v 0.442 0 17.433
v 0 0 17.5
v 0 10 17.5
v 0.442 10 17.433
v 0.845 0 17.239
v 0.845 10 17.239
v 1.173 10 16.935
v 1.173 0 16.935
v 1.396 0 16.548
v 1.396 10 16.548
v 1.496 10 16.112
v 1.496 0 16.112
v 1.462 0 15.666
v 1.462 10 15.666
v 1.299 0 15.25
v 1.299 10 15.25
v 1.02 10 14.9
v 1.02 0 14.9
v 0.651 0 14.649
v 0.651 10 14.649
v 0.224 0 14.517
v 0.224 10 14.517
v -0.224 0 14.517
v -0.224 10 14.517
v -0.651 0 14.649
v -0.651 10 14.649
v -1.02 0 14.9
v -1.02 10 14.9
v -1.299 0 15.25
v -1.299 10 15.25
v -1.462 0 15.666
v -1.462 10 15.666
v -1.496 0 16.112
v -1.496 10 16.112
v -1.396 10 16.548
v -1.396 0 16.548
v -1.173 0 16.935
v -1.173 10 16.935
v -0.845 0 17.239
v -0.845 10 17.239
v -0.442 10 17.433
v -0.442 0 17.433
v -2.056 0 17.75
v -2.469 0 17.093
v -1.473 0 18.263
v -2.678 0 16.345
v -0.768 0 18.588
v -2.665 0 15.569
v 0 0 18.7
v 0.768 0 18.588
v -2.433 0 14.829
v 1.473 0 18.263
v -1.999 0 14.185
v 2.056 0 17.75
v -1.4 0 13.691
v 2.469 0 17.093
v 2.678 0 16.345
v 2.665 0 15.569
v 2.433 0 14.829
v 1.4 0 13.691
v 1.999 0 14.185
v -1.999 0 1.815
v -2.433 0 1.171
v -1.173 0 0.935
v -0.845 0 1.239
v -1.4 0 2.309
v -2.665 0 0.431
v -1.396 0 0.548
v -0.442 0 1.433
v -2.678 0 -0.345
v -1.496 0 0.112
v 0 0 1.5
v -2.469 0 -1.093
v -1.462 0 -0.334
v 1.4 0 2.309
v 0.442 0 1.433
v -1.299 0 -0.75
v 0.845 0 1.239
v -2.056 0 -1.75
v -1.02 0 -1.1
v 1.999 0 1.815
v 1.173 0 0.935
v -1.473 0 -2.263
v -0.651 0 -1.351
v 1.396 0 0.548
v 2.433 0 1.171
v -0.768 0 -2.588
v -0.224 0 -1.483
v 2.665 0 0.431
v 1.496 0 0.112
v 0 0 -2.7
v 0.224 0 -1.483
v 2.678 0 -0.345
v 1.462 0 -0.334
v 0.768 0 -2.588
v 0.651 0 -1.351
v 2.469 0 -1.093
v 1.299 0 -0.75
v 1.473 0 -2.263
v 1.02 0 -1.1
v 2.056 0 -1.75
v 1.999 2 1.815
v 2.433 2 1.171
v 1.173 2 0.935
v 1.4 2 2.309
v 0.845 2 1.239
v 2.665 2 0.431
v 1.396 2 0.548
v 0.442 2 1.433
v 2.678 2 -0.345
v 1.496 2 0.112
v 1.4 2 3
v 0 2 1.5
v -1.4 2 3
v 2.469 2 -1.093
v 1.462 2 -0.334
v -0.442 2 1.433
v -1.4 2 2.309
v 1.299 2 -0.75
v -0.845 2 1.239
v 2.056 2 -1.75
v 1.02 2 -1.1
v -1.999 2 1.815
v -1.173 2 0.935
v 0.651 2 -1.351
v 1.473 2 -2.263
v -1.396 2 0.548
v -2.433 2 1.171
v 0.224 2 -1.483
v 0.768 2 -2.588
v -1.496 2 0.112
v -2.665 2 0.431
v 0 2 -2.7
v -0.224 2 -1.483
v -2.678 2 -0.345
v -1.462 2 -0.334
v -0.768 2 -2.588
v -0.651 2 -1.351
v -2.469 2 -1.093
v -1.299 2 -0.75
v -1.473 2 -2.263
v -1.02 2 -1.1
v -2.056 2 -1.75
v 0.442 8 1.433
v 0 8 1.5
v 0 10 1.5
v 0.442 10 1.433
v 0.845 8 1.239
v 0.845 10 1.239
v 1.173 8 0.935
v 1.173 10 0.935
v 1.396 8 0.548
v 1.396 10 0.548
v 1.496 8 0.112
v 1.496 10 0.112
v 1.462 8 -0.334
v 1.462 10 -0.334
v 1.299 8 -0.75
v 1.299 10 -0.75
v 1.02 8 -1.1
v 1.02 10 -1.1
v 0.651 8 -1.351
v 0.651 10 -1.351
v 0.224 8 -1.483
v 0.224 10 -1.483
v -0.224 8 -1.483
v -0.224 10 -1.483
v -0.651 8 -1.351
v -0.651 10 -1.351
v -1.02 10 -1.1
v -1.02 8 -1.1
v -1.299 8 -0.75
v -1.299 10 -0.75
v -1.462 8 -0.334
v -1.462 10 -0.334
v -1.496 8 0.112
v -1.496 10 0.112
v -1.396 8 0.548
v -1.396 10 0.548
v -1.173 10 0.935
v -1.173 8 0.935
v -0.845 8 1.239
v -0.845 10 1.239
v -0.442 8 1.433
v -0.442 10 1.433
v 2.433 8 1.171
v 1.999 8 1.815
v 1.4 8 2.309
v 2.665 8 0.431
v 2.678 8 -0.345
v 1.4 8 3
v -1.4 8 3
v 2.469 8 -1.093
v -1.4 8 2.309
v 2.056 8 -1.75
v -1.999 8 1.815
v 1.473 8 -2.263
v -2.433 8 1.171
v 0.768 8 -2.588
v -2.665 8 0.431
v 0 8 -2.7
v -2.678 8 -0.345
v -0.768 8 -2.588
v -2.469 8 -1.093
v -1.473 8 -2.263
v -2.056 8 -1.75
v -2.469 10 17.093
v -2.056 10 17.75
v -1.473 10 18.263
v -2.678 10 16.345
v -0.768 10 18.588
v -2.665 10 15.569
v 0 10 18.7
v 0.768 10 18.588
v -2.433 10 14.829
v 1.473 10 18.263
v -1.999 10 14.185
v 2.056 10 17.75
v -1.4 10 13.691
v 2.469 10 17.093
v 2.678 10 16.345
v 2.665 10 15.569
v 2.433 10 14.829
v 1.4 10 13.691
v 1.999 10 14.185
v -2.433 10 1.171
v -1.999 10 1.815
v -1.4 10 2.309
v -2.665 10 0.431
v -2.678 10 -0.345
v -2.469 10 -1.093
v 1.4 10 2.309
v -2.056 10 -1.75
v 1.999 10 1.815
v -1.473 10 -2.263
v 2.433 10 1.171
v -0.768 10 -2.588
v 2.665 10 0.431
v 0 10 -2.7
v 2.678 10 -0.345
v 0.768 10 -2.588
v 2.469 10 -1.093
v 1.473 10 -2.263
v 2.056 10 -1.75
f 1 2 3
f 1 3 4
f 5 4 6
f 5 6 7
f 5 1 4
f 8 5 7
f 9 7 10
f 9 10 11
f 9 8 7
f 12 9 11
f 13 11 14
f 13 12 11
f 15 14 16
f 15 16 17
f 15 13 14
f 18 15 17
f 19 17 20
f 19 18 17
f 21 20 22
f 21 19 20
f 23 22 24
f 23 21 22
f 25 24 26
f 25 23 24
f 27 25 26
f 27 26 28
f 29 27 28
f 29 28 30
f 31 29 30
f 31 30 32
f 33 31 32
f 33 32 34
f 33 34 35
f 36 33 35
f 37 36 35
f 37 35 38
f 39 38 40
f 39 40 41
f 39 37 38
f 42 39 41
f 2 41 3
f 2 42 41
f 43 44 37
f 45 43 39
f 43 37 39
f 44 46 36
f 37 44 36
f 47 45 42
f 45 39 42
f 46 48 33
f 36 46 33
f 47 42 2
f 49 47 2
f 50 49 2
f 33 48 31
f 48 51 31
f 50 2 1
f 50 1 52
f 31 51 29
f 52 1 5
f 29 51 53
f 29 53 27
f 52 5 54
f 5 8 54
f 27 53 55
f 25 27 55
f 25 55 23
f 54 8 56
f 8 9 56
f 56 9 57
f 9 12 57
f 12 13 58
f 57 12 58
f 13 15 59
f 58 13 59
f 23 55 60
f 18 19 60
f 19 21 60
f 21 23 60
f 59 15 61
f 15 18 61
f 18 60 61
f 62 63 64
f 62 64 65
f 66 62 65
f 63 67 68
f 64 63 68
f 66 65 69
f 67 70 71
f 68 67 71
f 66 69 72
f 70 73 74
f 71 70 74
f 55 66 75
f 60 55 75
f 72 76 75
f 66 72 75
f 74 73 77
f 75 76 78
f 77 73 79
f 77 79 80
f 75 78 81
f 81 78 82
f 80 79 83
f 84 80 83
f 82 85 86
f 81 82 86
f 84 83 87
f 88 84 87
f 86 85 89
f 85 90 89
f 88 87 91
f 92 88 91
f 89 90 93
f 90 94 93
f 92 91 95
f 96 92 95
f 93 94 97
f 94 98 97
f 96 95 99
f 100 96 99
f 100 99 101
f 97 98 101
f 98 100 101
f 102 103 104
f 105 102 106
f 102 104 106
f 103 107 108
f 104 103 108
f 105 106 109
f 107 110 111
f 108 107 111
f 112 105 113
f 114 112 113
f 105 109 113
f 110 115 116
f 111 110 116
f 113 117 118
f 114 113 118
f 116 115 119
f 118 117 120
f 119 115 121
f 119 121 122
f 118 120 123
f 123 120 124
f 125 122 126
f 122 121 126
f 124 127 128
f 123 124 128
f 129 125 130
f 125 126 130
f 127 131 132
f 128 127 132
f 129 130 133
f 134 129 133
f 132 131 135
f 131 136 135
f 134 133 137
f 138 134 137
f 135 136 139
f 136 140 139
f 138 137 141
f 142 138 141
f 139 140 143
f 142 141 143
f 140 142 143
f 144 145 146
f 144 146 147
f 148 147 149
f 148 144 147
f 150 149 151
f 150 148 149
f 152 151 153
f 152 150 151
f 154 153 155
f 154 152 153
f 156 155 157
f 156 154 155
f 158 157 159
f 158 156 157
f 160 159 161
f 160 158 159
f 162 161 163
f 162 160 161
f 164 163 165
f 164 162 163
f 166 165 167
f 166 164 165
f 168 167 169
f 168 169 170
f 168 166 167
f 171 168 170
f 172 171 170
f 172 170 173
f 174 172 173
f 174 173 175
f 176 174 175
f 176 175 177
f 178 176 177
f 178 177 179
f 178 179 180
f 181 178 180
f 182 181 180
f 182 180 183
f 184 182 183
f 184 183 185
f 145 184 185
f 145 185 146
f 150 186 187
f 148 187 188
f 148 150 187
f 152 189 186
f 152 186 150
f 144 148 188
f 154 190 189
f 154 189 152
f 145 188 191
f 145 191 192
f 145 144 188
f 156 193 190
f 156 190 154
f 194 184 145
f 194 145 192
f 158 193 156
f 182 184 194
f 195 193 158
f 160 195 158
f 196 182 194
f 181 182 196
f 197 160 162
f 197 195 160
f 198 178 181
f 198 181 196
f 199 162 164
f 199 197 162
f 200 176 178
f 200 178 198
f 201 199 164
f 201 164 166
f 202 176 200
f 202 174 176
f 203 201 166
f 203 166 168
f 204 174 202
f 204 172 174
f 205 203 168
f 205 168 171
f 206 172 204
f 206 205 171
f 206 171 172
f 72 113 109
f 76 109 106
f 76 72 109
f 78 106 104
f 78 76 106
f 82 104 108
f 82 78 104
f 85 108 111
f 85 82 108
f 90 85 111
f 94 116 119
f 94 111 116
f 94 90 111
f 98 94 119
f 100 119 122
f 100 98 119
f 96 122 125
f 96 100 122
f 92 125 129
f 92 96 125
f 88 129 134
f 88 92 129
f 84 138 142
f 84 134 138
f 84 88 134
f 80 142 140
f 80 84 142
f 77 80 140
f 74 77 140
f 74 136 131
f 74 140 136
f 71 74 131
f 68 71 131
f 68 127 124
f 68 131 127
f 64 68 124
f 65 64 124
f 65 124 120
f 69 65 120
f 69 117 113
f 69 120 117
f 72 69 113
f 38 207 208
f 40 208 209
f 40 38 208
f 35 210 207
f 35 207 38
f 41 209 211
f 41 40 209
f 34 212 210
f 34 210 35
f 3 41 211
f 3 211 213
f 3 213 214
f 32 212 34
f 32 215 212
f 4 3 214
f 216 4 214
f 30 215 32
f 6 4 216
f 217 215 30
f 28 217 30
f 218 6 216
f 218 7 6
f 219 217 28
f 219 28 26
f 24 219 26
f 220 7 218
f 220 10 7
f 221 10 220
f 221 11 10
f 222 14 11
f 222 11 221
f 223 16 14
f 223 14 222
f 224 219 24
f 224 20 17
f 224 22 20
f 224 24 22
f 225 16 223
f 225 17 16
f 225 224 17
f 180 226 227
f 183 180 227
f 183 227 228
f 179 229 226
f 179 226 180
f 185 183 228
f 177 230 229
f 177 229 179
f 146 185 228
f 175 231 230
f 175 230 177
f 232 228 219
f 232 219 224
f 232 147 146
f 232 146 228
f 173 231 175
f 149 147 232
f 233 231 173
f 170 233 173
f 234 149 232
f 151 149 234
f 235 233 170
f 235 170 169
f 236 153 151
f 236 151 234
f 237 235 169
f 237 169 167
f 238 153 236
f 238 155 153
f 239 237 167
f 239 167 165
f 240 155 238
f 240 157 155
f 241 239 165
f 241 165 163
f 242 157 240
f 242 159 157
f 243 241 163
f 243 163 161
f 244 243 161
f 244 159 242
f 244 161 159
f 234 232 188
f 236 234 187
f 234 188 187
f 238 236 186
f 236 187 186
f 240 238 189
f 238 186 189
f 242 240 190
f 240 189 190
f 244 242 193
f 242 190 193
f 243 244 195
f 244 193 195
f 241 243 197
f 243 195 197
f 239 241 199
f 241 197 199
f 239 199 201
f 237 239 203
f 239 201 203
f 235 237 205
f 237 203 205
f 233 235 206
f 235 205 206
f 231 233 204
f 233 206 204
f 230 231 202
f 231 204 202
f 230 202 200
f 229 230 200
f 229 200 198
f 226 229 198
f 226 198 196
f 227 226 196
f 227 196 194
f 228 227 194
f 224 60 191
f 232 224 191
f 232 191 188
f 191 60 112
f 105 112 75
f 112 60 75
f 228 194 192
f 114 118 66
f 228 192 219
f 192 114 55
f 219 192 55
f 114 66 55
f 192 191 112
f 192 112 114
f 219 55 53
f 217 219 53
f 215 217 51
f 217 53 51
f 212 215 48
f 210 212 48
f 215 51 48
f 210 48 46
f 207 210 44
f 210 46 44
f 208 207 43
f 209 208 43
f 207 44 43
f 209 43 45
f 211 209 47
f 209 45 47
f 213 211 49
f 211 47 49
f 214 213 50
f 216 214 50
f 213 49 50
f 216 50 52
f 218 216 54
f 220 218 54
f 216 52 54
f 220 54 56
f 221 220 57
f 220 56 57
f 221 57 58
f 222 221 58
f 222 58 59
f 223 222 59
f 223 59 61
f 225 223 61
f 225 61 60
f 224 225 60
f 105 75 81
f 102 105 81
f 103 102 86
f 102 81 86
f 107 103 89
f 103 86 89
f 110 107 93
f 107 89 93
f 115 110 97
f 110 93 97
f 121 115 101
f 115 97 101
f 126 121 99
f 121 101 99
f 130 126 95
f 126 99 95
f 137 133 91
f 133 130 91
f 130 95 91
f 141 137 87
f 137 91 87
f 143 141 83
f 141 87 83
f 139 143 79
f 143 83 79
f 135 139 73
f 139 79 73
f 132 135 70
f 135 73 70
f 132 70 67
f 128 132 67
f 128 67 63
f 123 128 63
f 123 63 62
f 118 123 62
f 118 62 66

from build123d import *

# Parameters (mm, degrees)
SKETCH_1_R               = 1.5
EXTRUDE_1_DEPTH          = 10
CUT_EXTRUDE_1_DEPTH      = 3
CUT_EXTRUDE_1_DEPTH_BACK = 3
SKETCH_2_R               = 2.7


with BuildPart() as part:
    # 草图1 → 凸台-拉伸1 (new body)
    with BuildSketch(Plane(origin=(0, 0, 0), x_dir=(1, 0, 0), z_dir=(0, 1, 0))):
        with BuildLine():
            Line((-1.4, -2.308679276), (-1.4, -13.691320724))
            ThreePointArc((-1.4, -13.691320724), (0, -18.7), (1.4, -13.691320724))
            Line((1.4, -13.691320724), (1.4, -2.308679276))
            ThreePointArc((1.4, -2.308679276), (0, 2.7), (-1.4, -2.308679276))
        make_face()
        with Locations(Location((0, 0, 0), (0, 0, 270))):
            Circle(SKETCH_1_R, mode=Mode.SUBTRACT)
        with Locations(Location((0, -16, 0), (0, 0, 270))):
            Circle(SKETCH_1_R, mode=Mode.SUBTRACT)
    extrude(amount=EXTRUDE_1_DEPTH)

    # 草图2 → 切除-拉伸1 (cut, two sides: drawn at the far end of the back side and taken through both)
    with BuildSketch(Plane(origin=(0, 5, 0), x_dir=(-1, 0, 0), z_dir=(0, -1, 0)).offset(-CUT_EXTRUDE_1_DEPTH_BACK)):
        with BuildLine():
            Line((-1.4, -2.308679276), (-1.4, -3))
            Line((-1.4, -3), (1.4, -3))
            Line((1.4, -3), (1.4, -2.308679276))
            ThreePointArc((1.4, -2.308679276), (0, -2.7), (-1.4, -2.308679276))
        make_face()
        Circle(SKETCH_2_R)
    extrude(amount=CUT_EXTRUDE_1_DEPTH + CUT_EXTRUDE_1_DEPTH_BACK, mode=Mode.SUBTRACT)


solid = part.part
